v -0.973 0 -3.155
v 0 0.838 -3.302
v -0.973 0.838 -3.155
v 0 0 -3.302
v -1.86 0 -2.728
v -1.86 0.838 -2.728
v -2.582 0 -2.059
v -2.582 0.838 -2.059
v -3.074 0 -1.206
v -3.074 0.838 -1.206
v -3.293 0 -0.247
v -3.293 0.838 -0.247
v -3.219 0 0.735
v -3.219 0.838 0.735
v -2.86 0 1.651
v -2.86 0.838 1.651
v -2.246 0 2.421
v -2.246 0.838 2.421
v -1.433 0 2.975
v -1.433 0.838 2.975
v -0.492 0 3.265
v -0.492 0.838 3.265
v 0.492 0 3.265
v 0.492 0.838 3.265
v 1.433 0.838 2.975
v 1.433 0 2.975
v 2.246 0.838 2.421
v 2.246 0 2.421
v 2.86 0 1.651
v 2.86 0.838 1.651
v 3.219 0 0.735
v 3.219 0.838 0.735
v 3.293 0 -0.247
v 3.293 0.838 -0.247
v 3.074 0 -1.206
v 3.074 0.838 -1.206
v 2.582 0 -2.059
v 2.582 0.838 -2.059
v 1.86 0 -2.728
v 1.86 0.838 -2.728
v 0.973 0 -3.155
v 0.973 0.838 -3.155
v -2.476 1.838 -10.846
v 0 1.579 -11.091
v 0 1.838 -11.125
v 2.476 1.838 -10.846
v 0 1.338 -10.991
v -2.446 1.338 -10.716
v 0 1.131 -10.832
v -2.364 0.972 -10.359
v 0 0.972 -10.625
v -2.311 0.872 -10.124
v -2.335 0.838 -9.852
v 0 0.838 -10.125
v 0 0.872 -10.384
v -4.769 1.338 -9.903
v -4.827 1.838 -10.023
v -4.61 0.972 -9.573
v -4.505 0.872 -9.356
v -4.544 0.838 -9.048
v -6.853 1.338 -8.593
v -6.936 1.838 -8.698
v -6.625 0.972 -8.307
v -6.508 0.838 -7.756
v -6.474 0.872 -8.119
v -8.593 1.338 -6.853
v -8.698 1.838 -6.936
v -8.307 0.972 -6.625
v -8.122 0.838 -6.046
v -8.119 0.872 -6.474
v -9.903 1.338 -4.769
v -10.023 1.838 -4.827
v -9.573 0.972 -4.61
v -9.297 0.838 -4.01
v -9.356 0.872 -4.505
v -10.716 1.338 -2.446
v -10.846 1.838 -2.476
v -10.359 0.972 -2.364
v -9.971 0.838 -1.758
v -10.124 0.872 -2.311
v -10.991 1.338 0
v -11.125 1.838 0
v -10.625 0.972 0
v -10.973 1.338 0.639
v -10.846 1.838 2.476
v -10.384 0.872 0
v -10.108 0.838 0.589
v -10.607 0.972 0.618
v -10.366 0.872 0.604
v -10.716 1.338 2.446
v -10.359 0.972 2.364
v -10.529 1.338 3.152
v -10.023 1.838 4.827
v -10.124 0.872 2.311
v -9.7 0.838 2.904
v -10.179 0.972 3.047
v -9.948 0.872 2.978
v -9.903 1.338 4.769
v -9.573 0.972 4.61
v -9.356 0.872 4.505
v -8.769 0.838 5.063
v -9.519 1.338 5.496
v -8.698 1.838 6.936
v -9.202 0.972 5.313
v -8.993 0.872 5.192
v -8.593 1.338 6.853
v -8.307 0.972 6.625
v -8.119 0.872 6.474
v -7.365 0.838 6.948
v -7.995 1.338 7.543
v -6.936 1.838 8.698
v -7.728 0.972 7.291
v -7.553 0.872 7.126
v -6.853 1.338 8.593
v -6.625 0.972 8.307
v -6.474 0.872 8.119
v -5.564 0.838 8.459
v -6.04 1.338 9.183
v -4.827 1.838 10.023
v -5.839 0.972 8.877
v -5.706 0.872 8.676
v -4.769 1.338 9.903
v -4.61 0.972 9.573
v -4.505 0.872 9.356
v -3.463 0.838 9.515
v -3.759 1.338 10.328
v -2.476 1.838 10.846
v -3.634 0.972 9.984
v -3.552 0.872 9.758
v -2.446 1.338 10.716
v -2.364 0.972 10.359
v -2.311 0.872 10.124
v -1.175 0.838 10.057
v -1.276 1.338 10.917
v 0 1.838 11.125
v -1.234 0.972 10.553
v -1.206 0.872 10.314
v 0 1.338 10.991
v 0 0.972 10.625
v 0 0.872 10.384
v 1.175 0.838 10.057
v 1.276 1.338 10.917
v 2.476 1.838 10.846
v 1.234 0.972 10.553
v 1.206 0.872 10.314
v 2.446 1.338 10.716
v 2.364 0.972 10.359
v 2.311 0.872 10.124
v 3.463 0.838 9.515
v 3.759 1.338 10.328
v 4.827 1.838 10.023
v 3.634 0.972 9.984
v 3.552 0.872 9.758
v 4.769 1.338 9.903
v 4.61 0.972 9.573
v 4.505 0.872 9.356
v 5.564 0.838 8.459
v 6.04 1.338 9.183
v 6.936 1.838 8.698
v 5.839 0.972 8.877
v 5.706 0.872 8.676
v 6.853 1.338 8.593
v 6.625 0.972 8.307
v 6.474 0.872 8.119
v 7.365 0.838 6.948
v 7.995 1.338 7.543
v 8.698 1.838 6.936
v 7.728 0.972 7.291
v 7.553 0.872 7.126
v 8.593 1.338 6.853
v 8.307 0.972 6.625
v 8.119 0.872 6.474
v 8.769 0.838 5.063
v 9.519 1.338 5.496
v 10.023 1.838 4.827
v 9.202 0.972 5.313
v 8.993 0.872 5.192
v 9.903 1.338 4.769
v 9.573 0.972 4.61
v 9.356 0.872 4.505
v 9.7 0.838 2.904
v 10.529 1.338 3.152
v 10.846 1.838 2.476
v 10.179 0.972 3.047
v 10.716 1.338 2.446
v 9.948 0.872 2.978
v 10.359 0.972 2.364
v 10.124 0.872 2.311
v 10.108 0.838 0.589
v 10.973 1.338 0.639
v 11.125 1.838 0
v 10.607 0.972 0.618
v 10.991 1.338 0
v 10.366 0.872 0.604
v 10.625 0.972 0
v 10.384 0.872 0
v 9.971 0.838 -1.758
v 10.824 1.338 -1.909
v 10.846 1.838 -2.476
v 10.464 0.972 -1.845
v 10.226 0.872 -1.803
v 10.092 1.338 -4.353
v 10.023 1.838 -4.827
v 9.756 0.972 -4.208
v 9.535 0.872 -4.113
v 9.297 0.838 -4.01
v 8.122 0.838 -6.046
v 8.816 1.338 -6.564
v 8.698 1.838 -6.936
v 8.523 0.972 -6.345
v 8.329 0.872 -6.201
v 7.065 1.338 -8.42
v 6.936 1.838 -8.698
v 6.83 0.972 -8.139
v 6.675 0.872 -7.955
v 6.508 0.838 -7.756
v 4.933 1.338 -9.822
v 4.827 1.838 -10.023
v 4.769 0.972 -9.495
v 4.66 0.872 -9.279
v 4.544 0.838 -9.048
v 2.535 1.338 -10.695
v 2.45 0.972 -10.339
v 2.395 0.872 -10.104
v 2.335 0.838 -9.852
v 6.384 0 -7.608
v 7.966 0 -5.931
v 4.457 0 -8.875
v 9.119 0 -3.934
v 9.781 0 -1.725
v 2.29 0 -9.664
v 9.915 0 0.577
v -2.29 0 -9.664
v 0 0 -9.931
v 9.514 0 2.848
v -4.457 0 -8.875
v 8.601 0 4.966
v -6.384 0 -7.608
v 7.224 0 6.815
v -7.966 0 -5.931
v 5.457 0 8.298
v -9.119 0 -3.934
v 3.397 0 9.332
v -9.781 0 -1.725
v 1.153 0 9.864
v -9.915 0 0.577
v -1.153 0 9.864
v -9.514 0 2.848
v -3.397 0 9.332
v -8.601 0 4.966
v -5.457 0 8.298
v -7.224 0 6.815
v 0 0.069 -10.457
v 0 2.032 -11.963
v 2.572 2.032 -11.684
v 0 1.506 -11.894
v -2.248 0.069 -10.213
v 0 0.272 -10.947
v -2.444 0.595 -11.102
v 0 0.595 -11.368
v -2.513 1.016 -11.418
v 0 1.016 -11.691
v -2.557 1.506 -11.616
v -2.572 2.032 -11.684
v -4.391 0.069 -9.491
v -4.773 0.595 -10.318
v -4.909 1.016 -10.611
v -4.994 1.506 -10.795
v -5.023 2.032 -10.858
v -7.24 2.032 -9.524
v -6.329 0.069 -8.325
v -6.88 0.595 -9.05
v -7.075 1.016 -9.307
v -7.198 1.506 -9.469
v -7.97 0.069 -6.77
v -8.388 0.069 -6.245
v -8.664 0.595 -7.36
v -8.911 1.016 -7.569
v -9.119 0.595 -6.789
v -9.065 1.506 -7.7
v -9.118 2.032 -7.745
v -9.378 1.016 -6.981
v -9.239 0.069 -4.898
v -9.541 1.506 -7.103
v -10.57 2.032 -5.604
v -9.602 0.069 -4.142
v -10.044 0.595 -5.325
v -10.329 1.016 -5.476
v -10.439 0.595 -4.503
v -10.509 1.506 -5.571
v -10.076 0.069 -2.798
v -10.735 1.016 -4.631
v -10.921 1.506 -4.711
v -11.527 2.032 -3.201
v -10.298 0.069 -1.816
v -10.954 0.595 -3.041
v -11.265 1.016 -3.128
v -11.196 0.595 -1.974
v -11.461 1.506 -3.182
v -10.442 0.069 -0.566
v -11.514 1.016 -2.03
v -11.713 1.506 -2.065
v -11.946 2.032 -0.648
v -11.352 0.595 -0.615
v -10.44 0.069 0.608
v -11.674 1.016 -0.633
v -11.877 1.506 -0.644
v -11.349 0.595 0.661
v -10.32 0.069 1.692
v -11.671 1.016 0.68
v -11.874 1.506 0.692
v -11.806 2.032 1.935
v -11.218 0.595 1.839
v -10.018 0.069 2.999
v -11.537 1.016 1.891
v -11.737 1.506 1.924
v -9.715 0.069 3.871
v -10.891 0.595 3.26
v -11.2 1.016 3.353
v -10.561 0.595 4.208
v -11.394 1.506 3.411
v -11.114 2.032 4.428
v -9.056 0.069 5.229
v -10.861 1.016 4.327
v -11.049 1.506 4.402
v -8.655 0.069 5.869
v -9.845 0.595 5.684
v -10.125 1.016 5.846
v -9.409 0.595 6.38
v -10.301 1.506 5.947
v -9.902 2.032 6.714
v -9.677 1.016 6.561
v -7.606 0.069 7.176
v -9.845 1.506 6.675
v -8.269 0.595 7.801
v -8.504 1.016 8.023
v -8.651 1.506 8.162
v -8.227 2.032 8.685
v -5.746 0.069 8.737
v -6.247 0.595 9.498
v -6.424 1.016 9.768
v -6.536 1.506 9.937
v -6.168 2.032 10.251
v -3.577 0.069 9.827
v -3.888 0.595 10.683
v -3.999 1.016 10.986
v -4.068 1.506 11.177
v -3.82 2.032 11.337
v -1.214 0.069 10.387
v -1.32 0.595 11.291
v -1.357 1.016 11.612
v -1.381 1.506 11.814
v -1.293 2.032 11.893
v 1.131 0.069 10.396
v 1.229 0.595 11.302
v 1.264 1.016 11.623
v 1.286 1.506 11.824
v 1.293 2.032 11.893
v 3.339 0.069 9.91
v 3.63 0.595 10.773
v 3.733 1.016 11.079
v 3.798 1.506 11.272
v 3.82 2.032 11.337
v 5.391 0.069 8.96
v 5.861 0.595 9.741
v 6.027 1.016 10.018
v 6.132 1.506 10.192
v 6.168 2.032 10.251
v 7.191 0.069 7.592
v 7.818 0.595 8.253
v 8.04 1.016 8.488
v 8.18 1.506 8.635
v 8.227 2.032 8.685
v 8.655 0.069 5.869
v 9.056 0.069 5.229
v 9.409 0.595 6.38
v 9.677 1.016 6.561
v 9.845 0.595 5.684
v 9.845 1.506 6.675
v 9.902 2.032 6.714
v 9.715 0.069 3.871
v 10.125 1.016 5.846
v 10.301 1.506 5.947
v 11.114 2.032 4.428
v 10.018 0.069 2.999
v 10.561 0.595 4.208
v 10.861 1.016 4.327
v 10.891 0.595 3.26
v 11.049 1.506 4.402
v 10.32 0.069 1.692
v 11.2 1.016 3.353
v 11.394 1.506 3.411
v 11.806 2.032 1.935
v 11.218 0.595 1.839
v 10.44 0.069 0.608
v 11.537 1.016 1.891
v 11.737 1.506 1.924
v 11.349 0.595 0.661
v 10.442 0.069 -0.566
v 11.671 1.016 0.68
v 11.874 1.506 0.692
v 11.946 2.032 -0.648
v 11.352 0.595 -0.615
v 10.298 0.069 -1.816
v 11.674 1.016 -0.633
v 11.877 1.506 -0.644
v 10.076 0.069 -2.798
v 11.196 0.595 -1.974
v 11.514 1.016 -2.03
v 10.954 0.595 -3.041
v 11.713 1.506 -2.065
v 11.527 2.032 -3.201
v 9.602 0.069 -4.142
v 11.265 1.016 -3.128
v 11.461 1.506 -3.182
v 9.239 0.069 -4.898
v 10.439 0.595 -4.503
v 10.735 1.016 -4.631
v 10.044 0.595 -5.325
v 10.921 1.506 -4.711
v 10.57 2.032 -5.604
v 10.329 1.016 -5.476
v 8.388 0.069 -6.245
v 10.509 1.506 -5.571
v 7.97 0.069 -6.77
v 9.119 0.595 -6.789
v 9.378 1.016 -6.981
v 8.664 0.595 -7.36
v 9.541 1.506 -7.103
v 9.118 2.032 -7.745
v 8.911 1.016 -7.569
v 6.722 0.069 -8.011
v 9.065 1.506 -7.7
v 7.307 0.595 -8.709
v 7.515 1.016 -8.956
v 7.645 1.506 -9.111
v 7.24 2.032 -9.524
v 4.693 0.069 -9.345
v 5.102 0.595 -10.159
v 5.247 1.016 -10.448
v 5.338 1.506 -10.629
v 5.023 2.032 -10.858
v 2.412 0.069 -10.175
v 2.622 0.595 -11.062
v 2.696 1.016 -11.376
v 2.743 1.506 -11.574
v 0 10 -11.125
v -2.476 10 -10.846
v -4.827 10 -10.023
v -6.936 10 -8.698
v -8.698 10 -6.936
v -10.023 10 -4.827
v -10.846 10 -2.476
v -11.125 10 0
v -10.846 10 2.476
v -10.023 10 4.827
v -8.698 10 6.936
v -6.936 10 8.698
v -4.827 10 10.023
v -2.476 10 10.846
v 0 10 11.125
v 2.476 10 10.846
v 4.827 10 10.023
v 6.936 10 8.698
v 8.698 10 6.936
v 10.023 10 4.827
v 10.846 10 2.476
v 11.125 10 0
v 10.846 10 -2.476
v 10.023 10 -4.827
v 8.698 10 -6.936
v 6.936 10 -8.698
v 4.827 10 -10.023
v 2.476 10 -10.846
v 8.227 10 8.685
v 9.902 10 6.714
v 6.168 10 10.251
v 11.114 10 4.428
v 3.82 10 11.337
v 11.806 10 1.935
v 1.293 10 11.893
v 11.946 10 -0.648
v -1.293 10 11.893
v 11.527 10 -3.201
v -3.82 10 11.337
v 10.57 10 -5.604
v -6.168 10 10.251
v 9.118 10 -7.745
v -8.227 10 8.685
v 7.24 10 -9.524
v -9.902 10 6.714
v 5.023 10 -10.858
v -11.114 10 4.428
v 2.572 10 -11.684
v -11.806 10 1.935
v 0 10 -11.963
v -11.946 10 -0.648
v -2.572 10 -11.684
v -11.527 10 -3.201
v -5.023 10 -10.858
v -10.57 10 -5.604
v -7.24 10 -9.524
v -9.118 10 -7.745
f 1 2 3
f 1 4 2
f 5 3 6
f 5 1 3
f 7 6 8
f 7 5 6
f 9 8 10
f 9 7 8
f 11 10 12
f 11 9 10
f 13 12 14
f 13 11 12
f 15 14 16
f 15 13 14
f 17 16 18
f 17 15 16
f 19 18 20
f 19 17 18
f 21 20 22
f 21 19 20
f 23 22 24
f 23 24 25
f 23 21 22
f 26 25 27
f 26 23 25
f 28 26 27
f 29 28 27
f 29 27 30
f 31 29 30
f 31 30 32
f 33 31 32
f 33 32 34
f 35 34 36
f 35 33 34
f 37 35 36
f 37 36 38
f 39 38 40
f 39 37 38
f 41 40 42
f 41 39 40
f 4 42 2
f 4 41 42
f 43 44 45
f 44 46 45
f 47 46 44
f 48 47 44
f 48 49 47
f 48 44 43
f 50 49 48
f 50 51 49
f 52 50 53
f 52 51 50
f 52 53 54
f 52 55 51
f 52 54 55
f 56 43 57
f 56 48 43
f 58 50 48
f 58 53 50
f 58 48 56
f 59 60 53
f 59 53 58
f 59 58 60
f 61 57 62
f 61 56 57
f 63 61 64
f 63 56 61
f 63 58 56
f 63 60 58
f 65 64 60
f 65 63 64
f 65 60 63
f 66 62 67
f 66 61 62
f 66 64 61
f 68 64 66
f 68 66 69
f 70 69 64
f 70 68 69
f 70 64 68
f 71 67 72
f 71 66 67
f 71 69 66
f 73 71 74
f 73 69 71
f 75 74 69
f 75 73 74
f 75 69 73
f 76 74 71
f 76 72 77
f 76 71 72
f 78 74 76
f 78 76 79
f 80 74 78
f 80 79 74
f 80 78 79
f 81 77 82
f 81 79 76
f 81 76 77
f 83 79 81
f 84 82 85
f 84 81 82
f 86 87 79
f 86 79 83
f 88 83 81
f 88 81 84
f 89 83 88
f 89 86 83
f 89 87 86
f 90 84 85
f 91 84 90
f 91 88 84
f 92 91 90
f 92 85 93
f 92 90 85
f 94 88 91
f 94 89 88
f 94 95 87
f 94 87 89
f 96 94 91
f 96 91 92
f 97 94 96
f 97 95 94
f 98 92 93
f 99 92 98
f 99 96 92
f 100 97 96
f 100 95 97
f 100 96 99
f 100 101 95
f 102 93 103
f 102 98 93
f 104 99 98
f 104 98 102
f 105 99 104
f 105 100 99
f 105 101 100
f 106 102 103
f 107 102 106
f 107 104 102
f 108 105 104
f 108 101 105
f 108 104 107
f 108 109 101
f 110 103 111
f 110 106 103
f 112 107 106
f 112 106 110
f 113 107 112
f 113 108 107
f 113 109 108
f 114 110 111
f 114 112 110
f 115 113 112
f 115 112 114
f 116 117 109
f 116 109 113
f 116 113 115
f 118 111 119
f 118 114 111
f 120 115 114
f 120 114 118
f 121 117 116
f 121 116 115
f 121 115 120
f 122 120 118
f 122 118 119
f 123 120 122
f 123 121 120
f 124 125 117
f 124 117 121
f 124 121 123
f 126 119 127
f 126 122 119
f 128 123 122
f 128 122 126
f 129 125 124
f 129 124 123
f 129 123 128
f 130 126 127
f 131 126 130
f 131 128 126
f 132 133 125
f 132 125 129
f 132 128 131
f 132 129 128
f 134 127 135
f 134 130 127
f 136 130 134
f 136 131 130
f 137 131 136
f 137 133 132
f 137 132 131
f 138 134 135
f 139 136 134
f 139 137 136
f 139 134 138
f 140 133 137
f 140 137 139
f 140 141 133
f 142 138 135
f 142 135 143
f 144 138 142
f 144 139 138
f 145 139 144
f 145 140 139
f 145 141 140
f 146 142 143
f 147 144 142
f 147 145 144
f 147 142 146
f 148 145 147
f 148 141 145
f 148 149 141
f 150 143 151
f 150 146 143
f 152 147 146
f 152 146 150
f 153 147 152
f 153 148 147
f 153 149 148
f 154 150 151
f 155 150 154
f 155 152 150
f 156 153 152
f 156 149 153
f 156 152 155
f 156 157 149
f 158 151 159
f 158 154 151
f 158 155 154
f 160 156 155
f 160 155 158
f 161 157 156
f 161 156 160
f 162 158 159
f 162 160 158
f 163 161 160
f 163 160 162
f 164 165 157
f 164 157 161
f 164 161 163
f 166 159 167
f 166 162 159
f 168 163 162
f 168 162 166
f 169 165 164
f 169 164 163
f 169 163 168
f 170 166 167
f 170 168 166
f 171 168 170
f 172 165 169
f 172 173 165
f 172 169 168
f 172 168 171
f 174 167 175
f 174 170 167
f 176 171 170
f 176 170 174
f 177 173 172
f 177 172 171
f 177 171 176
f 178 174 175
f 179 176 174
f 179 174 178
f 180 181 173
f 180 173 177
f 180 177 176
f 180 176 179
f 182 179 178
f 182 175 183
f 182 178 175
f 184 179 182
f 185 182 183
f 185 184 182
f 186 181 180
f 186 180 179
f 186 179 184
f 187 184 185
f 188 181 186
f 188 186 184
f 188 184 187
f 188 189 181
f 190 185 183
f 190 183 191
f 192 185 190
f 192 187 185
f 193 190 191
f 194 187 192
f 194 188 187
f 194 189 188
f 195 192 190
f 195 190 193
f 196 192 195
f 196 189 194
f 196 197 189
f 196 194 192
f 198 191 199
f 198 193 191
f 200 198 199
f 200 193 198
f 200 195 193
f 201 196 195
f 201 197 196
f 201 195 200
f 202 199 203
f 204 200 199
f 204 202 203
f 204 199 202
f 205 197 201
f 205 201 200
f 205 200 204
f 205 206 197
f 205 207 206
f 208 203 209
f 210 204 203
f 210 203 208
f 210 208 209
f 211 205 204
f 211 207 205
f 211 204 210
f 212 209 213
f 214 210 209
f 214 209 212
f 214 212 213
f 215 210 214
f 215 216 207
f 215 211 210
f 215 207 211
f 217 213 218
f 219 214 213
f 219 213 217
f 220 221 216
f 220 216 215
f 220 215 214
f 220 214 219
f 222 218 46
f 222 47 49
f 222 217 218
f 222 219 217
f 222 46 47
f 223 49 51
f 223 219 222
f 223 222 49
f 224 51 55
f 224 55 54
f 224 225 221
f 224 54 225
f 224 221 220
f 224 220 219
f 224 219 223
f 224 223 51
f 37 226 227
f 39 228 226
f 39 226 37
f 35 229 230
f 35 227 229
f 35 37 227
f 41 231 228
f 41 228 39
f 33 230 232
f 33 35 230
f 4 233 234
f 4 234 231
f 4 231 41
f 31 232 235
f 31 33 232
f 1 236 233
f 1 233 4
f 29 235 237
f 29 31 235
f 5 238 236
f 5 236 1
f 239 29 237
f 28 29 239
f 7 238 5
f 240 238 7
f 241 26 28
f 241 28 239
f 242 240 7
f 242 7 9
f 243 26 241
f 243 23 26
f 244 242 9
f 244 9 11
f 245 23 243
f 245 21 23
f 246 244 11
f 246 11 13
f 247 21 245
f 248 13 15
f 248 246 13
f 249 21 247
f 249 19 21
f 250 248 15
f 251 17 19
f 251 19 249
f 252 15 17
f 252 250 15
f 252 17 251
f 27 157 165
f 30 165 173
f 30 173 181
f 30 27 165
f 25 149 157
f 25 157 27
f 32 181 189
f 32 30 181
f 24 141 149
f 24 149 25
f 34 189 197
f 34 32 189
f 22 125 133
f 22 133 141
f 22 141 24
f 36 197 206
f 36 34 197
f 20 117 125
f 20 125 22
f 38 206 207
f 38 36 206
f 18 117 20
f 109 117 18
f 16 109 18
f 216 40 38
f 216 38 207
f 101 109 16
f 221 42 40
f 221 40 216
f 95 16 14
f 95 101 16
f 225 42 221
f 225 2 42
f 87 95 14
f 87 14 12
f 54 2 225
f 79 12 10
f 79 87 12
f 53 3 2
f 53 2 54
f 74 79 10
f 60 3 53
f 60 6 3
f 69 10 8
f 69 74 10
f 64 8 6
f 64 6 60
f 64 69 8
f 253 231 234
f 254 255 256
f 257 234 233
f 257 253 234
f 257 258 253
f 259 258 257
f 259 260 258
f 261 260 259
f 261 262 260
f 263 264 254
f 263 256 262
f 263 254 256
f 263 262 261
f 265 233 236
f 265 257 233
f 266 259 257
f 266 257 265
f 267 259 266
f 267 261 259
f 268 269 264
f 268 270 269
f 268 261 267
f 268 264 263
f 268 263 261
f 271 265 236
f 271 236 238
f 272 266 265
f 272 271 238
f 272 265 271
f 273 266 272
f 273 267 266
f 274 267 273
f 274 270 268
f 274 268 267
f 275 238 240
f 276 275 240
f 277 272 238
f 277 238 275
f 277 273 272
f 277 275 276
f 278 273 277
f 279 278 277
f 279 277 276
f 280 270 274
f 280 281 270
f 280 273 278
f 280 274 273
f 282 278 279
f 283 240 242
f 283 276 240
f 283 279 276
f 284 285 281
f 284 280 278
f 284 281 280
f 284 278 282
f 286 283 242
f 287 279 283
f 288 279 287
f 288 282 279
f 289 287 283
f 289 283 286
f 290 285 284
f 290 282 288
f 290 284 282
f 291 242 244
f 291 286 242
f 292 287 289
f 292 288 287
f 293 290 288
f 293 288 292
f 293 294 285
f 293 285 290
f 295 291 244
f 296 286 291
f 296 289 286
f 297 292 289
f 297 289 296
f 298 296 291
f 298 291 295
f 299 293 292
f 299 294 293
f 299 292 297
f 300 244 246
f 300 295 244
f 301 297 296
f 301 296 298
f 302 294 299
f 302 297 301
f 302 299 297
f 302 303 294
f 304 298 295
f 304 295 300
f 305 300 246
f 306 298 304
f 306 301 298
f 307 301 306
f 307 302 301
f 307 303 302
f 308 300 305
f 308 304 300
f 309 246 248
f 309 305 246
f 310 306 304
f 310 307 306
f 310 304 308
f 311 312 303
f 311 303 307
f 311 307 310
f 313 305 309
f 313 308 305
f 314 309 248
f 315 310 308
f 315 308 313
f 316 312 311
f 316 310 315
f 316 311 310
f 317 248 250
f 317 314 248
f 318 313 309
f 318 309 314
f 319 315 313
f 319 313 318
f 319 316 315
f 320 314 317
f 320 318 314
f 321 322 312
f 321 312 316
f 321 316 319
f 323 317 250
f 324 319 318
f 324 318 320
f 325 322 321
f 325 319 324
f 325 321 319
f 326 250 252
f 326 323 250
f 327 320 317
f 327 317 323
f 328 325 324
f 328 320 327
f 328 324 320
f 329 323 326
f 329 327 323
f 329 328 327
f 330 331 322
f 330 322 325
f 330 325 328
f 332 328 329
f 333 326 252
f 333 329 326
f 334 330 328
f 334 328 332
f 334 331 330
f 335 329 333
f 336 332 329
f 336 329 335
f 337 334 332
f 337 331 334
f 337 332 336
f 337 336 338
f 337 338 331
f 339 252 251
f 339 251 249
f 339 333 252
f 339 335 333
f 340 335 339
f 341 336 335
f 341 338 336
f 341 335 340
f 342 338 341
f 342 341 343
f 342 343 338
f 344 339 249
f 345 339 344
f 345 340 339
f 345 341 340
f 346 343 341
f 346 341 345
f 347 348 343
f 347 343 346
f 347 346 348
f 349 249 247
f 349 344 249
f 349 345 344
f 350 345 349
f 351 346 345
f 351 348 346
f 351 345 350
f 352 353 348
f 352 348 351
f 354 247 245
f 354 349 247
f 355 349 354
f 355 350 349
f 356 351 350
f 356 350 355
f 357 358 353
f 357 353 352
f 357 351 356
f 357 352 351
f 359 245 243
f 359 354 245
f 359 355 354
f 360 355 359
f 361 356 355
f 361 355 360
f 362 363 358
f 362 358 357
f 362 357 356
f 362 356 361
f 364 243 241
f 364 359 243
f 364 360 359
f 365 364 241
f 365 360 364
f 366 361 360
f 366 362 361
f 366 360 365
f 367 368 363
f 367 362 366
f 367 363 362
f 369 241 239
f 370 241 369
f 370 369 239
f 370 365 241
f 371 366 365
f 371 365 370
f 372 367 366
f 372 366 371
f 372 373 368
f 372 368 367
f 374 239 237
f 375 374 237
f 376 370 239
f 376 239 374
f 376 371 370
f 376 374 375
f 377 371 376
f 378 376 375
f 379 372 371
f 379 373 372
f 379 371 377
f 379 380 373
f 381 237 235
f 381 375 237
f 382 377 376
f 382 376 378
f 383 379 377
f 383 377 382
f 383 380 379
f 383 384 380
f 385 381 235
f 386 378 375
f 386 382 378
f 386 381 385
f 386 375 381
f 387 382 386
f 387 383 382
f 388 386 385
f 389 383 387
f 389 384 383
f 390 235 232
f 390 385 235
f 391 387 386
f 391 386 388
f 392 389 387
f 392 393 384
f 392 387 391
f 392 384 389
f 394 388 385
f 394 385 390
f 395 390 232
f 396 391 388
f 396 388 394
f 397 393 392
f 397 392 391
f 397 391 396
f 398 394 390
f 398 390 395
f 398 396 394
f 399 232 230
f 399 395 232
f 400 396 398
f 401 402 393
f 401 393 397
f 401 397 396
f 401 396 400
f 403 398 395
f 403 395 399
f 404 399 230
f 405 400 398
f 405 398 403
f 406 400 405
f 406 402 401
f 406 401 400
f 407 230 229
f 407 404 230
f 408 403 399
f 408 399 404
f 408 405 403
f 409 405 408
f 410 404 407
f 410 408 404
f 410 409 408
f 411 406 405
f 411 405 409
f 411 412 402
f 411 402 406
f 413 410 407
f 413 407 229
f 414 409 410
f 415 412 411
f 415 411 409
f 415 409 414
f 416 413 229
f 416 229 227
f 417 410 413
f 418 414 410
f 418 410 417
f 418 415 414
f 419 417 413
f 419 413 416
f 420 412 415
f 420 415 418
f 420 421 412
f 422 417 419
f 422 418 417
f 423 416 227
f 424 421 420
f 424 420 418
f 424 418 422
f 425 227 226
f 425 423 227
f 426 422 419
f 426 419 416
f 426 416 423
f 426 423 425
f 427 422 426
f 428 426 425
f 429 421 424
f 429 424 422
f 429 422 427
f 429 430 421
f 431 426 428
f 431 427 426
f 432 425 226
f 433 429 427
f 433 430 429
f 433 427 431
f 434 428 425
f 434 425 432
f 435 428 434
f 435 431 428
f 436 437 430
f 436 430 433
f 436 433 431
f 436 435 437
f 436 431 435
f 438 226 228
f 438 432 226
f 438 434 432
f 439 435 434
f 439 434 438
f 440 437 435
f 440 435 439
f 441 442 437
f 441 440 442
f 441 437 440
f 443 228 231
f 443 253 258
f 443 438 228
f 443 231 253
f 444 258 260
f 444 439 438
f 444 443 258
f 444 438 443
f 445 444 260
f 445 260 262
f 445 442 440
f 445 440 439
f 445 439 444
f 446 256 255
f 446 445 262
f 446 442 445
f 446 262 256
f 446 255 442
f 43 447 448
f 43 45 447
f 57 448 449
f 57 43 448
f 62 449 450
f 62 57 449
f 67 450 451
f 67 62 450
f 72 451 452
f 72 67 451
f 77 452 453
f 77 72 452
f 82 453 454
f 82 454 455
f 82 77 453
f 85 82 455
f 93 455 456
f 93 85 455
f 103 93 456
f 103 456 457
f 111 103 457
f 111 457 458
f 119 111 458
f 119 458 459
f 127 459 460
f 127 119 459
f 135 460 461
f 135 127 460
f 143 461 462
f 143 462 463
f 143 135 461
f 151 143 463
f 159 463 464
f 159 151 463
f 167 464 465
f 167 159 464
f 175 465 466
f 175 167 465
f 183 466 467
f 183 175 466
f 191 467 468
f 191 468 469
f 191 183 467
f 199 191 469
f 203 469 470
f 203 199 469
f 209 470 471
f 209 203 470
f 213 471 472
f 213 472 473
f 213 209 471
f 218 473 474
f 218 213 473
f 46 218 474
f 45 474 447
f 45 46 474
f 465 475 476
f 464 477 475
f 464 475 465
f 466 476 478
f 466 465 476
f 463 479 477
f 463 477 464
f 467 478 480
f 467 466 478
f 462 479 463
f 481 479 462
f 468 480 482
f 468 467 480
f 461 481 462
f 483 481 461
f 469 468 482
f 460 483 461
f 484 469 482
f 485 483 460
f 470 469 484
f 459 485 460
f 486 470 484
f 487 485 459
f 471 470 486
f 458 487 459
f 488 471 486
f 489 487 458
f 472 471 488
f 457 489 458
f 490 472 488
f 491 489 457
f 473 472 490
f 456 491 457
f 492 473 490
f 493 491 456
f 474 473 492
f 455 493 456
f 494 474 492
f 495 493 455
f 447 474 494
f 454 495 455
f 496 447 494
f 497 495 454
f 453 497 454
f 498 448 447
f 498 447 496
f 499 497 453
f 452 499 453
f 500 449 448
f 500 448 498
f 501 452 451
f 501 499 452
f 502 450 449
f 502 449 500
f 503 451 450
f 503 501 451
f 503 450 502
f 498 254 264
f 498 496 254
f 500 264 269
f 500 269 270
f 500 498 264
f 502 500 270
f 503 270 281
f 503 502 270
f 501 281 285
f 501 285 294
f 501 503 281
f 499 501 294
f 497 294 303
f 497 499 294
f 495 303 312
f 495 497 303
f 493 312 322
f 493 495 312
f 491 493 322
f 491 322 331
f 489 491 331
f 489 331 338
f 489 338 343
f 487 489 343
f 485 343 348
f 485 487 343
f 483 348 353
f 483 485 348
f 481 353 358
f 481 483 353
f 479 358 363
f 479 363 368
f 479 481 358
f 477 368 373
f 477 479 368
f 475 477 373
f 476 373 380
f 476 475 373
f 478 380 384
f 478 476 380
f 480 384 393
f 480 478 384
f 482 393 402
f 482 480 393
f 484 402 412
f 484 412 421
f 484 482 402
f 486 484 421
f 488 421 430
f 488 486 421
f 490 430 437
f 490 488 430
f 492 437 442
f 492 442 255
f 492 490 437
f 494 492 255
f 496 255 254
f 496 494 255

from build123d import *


with BuildPart() as part:
    # Sketch1 → Revolve1 (revolve)
    with BuildSketch(Plane.XY, mode=Mode.PRIVATE) as revolve1_sk:
        with BuildLine():
            Line((3.302, 0), (9.9314, 0))
            ThreePointArc((9.9314, 0), (11.368240979, 0.595159021), (11.9634, 2.032))
            Line((11.9634, 2.032), (11.9634, 10))
            Line((11.9634, 10), (11.1252, 10))
            Line((11.1252, 10), (11.1252, 1.8382))
            ThreePointArc((11.1252, 1.8382), (10.832306781, 1.131093219), (10.1252, 0.8382))
            Line((10.1252, 0.8382), (3.302, 0.8382))
            Line((3.302, 0.8382), (3.302, 0))
        make_face()
    revolve(revolve1_sk.sketch.rotate(Axis((0, 0, 0), (0, 1, 0)), 90), axis=Axis((0, 0, 0), (0, 1, 0)))  # turned: the seam where the file's is


solid = part.part
